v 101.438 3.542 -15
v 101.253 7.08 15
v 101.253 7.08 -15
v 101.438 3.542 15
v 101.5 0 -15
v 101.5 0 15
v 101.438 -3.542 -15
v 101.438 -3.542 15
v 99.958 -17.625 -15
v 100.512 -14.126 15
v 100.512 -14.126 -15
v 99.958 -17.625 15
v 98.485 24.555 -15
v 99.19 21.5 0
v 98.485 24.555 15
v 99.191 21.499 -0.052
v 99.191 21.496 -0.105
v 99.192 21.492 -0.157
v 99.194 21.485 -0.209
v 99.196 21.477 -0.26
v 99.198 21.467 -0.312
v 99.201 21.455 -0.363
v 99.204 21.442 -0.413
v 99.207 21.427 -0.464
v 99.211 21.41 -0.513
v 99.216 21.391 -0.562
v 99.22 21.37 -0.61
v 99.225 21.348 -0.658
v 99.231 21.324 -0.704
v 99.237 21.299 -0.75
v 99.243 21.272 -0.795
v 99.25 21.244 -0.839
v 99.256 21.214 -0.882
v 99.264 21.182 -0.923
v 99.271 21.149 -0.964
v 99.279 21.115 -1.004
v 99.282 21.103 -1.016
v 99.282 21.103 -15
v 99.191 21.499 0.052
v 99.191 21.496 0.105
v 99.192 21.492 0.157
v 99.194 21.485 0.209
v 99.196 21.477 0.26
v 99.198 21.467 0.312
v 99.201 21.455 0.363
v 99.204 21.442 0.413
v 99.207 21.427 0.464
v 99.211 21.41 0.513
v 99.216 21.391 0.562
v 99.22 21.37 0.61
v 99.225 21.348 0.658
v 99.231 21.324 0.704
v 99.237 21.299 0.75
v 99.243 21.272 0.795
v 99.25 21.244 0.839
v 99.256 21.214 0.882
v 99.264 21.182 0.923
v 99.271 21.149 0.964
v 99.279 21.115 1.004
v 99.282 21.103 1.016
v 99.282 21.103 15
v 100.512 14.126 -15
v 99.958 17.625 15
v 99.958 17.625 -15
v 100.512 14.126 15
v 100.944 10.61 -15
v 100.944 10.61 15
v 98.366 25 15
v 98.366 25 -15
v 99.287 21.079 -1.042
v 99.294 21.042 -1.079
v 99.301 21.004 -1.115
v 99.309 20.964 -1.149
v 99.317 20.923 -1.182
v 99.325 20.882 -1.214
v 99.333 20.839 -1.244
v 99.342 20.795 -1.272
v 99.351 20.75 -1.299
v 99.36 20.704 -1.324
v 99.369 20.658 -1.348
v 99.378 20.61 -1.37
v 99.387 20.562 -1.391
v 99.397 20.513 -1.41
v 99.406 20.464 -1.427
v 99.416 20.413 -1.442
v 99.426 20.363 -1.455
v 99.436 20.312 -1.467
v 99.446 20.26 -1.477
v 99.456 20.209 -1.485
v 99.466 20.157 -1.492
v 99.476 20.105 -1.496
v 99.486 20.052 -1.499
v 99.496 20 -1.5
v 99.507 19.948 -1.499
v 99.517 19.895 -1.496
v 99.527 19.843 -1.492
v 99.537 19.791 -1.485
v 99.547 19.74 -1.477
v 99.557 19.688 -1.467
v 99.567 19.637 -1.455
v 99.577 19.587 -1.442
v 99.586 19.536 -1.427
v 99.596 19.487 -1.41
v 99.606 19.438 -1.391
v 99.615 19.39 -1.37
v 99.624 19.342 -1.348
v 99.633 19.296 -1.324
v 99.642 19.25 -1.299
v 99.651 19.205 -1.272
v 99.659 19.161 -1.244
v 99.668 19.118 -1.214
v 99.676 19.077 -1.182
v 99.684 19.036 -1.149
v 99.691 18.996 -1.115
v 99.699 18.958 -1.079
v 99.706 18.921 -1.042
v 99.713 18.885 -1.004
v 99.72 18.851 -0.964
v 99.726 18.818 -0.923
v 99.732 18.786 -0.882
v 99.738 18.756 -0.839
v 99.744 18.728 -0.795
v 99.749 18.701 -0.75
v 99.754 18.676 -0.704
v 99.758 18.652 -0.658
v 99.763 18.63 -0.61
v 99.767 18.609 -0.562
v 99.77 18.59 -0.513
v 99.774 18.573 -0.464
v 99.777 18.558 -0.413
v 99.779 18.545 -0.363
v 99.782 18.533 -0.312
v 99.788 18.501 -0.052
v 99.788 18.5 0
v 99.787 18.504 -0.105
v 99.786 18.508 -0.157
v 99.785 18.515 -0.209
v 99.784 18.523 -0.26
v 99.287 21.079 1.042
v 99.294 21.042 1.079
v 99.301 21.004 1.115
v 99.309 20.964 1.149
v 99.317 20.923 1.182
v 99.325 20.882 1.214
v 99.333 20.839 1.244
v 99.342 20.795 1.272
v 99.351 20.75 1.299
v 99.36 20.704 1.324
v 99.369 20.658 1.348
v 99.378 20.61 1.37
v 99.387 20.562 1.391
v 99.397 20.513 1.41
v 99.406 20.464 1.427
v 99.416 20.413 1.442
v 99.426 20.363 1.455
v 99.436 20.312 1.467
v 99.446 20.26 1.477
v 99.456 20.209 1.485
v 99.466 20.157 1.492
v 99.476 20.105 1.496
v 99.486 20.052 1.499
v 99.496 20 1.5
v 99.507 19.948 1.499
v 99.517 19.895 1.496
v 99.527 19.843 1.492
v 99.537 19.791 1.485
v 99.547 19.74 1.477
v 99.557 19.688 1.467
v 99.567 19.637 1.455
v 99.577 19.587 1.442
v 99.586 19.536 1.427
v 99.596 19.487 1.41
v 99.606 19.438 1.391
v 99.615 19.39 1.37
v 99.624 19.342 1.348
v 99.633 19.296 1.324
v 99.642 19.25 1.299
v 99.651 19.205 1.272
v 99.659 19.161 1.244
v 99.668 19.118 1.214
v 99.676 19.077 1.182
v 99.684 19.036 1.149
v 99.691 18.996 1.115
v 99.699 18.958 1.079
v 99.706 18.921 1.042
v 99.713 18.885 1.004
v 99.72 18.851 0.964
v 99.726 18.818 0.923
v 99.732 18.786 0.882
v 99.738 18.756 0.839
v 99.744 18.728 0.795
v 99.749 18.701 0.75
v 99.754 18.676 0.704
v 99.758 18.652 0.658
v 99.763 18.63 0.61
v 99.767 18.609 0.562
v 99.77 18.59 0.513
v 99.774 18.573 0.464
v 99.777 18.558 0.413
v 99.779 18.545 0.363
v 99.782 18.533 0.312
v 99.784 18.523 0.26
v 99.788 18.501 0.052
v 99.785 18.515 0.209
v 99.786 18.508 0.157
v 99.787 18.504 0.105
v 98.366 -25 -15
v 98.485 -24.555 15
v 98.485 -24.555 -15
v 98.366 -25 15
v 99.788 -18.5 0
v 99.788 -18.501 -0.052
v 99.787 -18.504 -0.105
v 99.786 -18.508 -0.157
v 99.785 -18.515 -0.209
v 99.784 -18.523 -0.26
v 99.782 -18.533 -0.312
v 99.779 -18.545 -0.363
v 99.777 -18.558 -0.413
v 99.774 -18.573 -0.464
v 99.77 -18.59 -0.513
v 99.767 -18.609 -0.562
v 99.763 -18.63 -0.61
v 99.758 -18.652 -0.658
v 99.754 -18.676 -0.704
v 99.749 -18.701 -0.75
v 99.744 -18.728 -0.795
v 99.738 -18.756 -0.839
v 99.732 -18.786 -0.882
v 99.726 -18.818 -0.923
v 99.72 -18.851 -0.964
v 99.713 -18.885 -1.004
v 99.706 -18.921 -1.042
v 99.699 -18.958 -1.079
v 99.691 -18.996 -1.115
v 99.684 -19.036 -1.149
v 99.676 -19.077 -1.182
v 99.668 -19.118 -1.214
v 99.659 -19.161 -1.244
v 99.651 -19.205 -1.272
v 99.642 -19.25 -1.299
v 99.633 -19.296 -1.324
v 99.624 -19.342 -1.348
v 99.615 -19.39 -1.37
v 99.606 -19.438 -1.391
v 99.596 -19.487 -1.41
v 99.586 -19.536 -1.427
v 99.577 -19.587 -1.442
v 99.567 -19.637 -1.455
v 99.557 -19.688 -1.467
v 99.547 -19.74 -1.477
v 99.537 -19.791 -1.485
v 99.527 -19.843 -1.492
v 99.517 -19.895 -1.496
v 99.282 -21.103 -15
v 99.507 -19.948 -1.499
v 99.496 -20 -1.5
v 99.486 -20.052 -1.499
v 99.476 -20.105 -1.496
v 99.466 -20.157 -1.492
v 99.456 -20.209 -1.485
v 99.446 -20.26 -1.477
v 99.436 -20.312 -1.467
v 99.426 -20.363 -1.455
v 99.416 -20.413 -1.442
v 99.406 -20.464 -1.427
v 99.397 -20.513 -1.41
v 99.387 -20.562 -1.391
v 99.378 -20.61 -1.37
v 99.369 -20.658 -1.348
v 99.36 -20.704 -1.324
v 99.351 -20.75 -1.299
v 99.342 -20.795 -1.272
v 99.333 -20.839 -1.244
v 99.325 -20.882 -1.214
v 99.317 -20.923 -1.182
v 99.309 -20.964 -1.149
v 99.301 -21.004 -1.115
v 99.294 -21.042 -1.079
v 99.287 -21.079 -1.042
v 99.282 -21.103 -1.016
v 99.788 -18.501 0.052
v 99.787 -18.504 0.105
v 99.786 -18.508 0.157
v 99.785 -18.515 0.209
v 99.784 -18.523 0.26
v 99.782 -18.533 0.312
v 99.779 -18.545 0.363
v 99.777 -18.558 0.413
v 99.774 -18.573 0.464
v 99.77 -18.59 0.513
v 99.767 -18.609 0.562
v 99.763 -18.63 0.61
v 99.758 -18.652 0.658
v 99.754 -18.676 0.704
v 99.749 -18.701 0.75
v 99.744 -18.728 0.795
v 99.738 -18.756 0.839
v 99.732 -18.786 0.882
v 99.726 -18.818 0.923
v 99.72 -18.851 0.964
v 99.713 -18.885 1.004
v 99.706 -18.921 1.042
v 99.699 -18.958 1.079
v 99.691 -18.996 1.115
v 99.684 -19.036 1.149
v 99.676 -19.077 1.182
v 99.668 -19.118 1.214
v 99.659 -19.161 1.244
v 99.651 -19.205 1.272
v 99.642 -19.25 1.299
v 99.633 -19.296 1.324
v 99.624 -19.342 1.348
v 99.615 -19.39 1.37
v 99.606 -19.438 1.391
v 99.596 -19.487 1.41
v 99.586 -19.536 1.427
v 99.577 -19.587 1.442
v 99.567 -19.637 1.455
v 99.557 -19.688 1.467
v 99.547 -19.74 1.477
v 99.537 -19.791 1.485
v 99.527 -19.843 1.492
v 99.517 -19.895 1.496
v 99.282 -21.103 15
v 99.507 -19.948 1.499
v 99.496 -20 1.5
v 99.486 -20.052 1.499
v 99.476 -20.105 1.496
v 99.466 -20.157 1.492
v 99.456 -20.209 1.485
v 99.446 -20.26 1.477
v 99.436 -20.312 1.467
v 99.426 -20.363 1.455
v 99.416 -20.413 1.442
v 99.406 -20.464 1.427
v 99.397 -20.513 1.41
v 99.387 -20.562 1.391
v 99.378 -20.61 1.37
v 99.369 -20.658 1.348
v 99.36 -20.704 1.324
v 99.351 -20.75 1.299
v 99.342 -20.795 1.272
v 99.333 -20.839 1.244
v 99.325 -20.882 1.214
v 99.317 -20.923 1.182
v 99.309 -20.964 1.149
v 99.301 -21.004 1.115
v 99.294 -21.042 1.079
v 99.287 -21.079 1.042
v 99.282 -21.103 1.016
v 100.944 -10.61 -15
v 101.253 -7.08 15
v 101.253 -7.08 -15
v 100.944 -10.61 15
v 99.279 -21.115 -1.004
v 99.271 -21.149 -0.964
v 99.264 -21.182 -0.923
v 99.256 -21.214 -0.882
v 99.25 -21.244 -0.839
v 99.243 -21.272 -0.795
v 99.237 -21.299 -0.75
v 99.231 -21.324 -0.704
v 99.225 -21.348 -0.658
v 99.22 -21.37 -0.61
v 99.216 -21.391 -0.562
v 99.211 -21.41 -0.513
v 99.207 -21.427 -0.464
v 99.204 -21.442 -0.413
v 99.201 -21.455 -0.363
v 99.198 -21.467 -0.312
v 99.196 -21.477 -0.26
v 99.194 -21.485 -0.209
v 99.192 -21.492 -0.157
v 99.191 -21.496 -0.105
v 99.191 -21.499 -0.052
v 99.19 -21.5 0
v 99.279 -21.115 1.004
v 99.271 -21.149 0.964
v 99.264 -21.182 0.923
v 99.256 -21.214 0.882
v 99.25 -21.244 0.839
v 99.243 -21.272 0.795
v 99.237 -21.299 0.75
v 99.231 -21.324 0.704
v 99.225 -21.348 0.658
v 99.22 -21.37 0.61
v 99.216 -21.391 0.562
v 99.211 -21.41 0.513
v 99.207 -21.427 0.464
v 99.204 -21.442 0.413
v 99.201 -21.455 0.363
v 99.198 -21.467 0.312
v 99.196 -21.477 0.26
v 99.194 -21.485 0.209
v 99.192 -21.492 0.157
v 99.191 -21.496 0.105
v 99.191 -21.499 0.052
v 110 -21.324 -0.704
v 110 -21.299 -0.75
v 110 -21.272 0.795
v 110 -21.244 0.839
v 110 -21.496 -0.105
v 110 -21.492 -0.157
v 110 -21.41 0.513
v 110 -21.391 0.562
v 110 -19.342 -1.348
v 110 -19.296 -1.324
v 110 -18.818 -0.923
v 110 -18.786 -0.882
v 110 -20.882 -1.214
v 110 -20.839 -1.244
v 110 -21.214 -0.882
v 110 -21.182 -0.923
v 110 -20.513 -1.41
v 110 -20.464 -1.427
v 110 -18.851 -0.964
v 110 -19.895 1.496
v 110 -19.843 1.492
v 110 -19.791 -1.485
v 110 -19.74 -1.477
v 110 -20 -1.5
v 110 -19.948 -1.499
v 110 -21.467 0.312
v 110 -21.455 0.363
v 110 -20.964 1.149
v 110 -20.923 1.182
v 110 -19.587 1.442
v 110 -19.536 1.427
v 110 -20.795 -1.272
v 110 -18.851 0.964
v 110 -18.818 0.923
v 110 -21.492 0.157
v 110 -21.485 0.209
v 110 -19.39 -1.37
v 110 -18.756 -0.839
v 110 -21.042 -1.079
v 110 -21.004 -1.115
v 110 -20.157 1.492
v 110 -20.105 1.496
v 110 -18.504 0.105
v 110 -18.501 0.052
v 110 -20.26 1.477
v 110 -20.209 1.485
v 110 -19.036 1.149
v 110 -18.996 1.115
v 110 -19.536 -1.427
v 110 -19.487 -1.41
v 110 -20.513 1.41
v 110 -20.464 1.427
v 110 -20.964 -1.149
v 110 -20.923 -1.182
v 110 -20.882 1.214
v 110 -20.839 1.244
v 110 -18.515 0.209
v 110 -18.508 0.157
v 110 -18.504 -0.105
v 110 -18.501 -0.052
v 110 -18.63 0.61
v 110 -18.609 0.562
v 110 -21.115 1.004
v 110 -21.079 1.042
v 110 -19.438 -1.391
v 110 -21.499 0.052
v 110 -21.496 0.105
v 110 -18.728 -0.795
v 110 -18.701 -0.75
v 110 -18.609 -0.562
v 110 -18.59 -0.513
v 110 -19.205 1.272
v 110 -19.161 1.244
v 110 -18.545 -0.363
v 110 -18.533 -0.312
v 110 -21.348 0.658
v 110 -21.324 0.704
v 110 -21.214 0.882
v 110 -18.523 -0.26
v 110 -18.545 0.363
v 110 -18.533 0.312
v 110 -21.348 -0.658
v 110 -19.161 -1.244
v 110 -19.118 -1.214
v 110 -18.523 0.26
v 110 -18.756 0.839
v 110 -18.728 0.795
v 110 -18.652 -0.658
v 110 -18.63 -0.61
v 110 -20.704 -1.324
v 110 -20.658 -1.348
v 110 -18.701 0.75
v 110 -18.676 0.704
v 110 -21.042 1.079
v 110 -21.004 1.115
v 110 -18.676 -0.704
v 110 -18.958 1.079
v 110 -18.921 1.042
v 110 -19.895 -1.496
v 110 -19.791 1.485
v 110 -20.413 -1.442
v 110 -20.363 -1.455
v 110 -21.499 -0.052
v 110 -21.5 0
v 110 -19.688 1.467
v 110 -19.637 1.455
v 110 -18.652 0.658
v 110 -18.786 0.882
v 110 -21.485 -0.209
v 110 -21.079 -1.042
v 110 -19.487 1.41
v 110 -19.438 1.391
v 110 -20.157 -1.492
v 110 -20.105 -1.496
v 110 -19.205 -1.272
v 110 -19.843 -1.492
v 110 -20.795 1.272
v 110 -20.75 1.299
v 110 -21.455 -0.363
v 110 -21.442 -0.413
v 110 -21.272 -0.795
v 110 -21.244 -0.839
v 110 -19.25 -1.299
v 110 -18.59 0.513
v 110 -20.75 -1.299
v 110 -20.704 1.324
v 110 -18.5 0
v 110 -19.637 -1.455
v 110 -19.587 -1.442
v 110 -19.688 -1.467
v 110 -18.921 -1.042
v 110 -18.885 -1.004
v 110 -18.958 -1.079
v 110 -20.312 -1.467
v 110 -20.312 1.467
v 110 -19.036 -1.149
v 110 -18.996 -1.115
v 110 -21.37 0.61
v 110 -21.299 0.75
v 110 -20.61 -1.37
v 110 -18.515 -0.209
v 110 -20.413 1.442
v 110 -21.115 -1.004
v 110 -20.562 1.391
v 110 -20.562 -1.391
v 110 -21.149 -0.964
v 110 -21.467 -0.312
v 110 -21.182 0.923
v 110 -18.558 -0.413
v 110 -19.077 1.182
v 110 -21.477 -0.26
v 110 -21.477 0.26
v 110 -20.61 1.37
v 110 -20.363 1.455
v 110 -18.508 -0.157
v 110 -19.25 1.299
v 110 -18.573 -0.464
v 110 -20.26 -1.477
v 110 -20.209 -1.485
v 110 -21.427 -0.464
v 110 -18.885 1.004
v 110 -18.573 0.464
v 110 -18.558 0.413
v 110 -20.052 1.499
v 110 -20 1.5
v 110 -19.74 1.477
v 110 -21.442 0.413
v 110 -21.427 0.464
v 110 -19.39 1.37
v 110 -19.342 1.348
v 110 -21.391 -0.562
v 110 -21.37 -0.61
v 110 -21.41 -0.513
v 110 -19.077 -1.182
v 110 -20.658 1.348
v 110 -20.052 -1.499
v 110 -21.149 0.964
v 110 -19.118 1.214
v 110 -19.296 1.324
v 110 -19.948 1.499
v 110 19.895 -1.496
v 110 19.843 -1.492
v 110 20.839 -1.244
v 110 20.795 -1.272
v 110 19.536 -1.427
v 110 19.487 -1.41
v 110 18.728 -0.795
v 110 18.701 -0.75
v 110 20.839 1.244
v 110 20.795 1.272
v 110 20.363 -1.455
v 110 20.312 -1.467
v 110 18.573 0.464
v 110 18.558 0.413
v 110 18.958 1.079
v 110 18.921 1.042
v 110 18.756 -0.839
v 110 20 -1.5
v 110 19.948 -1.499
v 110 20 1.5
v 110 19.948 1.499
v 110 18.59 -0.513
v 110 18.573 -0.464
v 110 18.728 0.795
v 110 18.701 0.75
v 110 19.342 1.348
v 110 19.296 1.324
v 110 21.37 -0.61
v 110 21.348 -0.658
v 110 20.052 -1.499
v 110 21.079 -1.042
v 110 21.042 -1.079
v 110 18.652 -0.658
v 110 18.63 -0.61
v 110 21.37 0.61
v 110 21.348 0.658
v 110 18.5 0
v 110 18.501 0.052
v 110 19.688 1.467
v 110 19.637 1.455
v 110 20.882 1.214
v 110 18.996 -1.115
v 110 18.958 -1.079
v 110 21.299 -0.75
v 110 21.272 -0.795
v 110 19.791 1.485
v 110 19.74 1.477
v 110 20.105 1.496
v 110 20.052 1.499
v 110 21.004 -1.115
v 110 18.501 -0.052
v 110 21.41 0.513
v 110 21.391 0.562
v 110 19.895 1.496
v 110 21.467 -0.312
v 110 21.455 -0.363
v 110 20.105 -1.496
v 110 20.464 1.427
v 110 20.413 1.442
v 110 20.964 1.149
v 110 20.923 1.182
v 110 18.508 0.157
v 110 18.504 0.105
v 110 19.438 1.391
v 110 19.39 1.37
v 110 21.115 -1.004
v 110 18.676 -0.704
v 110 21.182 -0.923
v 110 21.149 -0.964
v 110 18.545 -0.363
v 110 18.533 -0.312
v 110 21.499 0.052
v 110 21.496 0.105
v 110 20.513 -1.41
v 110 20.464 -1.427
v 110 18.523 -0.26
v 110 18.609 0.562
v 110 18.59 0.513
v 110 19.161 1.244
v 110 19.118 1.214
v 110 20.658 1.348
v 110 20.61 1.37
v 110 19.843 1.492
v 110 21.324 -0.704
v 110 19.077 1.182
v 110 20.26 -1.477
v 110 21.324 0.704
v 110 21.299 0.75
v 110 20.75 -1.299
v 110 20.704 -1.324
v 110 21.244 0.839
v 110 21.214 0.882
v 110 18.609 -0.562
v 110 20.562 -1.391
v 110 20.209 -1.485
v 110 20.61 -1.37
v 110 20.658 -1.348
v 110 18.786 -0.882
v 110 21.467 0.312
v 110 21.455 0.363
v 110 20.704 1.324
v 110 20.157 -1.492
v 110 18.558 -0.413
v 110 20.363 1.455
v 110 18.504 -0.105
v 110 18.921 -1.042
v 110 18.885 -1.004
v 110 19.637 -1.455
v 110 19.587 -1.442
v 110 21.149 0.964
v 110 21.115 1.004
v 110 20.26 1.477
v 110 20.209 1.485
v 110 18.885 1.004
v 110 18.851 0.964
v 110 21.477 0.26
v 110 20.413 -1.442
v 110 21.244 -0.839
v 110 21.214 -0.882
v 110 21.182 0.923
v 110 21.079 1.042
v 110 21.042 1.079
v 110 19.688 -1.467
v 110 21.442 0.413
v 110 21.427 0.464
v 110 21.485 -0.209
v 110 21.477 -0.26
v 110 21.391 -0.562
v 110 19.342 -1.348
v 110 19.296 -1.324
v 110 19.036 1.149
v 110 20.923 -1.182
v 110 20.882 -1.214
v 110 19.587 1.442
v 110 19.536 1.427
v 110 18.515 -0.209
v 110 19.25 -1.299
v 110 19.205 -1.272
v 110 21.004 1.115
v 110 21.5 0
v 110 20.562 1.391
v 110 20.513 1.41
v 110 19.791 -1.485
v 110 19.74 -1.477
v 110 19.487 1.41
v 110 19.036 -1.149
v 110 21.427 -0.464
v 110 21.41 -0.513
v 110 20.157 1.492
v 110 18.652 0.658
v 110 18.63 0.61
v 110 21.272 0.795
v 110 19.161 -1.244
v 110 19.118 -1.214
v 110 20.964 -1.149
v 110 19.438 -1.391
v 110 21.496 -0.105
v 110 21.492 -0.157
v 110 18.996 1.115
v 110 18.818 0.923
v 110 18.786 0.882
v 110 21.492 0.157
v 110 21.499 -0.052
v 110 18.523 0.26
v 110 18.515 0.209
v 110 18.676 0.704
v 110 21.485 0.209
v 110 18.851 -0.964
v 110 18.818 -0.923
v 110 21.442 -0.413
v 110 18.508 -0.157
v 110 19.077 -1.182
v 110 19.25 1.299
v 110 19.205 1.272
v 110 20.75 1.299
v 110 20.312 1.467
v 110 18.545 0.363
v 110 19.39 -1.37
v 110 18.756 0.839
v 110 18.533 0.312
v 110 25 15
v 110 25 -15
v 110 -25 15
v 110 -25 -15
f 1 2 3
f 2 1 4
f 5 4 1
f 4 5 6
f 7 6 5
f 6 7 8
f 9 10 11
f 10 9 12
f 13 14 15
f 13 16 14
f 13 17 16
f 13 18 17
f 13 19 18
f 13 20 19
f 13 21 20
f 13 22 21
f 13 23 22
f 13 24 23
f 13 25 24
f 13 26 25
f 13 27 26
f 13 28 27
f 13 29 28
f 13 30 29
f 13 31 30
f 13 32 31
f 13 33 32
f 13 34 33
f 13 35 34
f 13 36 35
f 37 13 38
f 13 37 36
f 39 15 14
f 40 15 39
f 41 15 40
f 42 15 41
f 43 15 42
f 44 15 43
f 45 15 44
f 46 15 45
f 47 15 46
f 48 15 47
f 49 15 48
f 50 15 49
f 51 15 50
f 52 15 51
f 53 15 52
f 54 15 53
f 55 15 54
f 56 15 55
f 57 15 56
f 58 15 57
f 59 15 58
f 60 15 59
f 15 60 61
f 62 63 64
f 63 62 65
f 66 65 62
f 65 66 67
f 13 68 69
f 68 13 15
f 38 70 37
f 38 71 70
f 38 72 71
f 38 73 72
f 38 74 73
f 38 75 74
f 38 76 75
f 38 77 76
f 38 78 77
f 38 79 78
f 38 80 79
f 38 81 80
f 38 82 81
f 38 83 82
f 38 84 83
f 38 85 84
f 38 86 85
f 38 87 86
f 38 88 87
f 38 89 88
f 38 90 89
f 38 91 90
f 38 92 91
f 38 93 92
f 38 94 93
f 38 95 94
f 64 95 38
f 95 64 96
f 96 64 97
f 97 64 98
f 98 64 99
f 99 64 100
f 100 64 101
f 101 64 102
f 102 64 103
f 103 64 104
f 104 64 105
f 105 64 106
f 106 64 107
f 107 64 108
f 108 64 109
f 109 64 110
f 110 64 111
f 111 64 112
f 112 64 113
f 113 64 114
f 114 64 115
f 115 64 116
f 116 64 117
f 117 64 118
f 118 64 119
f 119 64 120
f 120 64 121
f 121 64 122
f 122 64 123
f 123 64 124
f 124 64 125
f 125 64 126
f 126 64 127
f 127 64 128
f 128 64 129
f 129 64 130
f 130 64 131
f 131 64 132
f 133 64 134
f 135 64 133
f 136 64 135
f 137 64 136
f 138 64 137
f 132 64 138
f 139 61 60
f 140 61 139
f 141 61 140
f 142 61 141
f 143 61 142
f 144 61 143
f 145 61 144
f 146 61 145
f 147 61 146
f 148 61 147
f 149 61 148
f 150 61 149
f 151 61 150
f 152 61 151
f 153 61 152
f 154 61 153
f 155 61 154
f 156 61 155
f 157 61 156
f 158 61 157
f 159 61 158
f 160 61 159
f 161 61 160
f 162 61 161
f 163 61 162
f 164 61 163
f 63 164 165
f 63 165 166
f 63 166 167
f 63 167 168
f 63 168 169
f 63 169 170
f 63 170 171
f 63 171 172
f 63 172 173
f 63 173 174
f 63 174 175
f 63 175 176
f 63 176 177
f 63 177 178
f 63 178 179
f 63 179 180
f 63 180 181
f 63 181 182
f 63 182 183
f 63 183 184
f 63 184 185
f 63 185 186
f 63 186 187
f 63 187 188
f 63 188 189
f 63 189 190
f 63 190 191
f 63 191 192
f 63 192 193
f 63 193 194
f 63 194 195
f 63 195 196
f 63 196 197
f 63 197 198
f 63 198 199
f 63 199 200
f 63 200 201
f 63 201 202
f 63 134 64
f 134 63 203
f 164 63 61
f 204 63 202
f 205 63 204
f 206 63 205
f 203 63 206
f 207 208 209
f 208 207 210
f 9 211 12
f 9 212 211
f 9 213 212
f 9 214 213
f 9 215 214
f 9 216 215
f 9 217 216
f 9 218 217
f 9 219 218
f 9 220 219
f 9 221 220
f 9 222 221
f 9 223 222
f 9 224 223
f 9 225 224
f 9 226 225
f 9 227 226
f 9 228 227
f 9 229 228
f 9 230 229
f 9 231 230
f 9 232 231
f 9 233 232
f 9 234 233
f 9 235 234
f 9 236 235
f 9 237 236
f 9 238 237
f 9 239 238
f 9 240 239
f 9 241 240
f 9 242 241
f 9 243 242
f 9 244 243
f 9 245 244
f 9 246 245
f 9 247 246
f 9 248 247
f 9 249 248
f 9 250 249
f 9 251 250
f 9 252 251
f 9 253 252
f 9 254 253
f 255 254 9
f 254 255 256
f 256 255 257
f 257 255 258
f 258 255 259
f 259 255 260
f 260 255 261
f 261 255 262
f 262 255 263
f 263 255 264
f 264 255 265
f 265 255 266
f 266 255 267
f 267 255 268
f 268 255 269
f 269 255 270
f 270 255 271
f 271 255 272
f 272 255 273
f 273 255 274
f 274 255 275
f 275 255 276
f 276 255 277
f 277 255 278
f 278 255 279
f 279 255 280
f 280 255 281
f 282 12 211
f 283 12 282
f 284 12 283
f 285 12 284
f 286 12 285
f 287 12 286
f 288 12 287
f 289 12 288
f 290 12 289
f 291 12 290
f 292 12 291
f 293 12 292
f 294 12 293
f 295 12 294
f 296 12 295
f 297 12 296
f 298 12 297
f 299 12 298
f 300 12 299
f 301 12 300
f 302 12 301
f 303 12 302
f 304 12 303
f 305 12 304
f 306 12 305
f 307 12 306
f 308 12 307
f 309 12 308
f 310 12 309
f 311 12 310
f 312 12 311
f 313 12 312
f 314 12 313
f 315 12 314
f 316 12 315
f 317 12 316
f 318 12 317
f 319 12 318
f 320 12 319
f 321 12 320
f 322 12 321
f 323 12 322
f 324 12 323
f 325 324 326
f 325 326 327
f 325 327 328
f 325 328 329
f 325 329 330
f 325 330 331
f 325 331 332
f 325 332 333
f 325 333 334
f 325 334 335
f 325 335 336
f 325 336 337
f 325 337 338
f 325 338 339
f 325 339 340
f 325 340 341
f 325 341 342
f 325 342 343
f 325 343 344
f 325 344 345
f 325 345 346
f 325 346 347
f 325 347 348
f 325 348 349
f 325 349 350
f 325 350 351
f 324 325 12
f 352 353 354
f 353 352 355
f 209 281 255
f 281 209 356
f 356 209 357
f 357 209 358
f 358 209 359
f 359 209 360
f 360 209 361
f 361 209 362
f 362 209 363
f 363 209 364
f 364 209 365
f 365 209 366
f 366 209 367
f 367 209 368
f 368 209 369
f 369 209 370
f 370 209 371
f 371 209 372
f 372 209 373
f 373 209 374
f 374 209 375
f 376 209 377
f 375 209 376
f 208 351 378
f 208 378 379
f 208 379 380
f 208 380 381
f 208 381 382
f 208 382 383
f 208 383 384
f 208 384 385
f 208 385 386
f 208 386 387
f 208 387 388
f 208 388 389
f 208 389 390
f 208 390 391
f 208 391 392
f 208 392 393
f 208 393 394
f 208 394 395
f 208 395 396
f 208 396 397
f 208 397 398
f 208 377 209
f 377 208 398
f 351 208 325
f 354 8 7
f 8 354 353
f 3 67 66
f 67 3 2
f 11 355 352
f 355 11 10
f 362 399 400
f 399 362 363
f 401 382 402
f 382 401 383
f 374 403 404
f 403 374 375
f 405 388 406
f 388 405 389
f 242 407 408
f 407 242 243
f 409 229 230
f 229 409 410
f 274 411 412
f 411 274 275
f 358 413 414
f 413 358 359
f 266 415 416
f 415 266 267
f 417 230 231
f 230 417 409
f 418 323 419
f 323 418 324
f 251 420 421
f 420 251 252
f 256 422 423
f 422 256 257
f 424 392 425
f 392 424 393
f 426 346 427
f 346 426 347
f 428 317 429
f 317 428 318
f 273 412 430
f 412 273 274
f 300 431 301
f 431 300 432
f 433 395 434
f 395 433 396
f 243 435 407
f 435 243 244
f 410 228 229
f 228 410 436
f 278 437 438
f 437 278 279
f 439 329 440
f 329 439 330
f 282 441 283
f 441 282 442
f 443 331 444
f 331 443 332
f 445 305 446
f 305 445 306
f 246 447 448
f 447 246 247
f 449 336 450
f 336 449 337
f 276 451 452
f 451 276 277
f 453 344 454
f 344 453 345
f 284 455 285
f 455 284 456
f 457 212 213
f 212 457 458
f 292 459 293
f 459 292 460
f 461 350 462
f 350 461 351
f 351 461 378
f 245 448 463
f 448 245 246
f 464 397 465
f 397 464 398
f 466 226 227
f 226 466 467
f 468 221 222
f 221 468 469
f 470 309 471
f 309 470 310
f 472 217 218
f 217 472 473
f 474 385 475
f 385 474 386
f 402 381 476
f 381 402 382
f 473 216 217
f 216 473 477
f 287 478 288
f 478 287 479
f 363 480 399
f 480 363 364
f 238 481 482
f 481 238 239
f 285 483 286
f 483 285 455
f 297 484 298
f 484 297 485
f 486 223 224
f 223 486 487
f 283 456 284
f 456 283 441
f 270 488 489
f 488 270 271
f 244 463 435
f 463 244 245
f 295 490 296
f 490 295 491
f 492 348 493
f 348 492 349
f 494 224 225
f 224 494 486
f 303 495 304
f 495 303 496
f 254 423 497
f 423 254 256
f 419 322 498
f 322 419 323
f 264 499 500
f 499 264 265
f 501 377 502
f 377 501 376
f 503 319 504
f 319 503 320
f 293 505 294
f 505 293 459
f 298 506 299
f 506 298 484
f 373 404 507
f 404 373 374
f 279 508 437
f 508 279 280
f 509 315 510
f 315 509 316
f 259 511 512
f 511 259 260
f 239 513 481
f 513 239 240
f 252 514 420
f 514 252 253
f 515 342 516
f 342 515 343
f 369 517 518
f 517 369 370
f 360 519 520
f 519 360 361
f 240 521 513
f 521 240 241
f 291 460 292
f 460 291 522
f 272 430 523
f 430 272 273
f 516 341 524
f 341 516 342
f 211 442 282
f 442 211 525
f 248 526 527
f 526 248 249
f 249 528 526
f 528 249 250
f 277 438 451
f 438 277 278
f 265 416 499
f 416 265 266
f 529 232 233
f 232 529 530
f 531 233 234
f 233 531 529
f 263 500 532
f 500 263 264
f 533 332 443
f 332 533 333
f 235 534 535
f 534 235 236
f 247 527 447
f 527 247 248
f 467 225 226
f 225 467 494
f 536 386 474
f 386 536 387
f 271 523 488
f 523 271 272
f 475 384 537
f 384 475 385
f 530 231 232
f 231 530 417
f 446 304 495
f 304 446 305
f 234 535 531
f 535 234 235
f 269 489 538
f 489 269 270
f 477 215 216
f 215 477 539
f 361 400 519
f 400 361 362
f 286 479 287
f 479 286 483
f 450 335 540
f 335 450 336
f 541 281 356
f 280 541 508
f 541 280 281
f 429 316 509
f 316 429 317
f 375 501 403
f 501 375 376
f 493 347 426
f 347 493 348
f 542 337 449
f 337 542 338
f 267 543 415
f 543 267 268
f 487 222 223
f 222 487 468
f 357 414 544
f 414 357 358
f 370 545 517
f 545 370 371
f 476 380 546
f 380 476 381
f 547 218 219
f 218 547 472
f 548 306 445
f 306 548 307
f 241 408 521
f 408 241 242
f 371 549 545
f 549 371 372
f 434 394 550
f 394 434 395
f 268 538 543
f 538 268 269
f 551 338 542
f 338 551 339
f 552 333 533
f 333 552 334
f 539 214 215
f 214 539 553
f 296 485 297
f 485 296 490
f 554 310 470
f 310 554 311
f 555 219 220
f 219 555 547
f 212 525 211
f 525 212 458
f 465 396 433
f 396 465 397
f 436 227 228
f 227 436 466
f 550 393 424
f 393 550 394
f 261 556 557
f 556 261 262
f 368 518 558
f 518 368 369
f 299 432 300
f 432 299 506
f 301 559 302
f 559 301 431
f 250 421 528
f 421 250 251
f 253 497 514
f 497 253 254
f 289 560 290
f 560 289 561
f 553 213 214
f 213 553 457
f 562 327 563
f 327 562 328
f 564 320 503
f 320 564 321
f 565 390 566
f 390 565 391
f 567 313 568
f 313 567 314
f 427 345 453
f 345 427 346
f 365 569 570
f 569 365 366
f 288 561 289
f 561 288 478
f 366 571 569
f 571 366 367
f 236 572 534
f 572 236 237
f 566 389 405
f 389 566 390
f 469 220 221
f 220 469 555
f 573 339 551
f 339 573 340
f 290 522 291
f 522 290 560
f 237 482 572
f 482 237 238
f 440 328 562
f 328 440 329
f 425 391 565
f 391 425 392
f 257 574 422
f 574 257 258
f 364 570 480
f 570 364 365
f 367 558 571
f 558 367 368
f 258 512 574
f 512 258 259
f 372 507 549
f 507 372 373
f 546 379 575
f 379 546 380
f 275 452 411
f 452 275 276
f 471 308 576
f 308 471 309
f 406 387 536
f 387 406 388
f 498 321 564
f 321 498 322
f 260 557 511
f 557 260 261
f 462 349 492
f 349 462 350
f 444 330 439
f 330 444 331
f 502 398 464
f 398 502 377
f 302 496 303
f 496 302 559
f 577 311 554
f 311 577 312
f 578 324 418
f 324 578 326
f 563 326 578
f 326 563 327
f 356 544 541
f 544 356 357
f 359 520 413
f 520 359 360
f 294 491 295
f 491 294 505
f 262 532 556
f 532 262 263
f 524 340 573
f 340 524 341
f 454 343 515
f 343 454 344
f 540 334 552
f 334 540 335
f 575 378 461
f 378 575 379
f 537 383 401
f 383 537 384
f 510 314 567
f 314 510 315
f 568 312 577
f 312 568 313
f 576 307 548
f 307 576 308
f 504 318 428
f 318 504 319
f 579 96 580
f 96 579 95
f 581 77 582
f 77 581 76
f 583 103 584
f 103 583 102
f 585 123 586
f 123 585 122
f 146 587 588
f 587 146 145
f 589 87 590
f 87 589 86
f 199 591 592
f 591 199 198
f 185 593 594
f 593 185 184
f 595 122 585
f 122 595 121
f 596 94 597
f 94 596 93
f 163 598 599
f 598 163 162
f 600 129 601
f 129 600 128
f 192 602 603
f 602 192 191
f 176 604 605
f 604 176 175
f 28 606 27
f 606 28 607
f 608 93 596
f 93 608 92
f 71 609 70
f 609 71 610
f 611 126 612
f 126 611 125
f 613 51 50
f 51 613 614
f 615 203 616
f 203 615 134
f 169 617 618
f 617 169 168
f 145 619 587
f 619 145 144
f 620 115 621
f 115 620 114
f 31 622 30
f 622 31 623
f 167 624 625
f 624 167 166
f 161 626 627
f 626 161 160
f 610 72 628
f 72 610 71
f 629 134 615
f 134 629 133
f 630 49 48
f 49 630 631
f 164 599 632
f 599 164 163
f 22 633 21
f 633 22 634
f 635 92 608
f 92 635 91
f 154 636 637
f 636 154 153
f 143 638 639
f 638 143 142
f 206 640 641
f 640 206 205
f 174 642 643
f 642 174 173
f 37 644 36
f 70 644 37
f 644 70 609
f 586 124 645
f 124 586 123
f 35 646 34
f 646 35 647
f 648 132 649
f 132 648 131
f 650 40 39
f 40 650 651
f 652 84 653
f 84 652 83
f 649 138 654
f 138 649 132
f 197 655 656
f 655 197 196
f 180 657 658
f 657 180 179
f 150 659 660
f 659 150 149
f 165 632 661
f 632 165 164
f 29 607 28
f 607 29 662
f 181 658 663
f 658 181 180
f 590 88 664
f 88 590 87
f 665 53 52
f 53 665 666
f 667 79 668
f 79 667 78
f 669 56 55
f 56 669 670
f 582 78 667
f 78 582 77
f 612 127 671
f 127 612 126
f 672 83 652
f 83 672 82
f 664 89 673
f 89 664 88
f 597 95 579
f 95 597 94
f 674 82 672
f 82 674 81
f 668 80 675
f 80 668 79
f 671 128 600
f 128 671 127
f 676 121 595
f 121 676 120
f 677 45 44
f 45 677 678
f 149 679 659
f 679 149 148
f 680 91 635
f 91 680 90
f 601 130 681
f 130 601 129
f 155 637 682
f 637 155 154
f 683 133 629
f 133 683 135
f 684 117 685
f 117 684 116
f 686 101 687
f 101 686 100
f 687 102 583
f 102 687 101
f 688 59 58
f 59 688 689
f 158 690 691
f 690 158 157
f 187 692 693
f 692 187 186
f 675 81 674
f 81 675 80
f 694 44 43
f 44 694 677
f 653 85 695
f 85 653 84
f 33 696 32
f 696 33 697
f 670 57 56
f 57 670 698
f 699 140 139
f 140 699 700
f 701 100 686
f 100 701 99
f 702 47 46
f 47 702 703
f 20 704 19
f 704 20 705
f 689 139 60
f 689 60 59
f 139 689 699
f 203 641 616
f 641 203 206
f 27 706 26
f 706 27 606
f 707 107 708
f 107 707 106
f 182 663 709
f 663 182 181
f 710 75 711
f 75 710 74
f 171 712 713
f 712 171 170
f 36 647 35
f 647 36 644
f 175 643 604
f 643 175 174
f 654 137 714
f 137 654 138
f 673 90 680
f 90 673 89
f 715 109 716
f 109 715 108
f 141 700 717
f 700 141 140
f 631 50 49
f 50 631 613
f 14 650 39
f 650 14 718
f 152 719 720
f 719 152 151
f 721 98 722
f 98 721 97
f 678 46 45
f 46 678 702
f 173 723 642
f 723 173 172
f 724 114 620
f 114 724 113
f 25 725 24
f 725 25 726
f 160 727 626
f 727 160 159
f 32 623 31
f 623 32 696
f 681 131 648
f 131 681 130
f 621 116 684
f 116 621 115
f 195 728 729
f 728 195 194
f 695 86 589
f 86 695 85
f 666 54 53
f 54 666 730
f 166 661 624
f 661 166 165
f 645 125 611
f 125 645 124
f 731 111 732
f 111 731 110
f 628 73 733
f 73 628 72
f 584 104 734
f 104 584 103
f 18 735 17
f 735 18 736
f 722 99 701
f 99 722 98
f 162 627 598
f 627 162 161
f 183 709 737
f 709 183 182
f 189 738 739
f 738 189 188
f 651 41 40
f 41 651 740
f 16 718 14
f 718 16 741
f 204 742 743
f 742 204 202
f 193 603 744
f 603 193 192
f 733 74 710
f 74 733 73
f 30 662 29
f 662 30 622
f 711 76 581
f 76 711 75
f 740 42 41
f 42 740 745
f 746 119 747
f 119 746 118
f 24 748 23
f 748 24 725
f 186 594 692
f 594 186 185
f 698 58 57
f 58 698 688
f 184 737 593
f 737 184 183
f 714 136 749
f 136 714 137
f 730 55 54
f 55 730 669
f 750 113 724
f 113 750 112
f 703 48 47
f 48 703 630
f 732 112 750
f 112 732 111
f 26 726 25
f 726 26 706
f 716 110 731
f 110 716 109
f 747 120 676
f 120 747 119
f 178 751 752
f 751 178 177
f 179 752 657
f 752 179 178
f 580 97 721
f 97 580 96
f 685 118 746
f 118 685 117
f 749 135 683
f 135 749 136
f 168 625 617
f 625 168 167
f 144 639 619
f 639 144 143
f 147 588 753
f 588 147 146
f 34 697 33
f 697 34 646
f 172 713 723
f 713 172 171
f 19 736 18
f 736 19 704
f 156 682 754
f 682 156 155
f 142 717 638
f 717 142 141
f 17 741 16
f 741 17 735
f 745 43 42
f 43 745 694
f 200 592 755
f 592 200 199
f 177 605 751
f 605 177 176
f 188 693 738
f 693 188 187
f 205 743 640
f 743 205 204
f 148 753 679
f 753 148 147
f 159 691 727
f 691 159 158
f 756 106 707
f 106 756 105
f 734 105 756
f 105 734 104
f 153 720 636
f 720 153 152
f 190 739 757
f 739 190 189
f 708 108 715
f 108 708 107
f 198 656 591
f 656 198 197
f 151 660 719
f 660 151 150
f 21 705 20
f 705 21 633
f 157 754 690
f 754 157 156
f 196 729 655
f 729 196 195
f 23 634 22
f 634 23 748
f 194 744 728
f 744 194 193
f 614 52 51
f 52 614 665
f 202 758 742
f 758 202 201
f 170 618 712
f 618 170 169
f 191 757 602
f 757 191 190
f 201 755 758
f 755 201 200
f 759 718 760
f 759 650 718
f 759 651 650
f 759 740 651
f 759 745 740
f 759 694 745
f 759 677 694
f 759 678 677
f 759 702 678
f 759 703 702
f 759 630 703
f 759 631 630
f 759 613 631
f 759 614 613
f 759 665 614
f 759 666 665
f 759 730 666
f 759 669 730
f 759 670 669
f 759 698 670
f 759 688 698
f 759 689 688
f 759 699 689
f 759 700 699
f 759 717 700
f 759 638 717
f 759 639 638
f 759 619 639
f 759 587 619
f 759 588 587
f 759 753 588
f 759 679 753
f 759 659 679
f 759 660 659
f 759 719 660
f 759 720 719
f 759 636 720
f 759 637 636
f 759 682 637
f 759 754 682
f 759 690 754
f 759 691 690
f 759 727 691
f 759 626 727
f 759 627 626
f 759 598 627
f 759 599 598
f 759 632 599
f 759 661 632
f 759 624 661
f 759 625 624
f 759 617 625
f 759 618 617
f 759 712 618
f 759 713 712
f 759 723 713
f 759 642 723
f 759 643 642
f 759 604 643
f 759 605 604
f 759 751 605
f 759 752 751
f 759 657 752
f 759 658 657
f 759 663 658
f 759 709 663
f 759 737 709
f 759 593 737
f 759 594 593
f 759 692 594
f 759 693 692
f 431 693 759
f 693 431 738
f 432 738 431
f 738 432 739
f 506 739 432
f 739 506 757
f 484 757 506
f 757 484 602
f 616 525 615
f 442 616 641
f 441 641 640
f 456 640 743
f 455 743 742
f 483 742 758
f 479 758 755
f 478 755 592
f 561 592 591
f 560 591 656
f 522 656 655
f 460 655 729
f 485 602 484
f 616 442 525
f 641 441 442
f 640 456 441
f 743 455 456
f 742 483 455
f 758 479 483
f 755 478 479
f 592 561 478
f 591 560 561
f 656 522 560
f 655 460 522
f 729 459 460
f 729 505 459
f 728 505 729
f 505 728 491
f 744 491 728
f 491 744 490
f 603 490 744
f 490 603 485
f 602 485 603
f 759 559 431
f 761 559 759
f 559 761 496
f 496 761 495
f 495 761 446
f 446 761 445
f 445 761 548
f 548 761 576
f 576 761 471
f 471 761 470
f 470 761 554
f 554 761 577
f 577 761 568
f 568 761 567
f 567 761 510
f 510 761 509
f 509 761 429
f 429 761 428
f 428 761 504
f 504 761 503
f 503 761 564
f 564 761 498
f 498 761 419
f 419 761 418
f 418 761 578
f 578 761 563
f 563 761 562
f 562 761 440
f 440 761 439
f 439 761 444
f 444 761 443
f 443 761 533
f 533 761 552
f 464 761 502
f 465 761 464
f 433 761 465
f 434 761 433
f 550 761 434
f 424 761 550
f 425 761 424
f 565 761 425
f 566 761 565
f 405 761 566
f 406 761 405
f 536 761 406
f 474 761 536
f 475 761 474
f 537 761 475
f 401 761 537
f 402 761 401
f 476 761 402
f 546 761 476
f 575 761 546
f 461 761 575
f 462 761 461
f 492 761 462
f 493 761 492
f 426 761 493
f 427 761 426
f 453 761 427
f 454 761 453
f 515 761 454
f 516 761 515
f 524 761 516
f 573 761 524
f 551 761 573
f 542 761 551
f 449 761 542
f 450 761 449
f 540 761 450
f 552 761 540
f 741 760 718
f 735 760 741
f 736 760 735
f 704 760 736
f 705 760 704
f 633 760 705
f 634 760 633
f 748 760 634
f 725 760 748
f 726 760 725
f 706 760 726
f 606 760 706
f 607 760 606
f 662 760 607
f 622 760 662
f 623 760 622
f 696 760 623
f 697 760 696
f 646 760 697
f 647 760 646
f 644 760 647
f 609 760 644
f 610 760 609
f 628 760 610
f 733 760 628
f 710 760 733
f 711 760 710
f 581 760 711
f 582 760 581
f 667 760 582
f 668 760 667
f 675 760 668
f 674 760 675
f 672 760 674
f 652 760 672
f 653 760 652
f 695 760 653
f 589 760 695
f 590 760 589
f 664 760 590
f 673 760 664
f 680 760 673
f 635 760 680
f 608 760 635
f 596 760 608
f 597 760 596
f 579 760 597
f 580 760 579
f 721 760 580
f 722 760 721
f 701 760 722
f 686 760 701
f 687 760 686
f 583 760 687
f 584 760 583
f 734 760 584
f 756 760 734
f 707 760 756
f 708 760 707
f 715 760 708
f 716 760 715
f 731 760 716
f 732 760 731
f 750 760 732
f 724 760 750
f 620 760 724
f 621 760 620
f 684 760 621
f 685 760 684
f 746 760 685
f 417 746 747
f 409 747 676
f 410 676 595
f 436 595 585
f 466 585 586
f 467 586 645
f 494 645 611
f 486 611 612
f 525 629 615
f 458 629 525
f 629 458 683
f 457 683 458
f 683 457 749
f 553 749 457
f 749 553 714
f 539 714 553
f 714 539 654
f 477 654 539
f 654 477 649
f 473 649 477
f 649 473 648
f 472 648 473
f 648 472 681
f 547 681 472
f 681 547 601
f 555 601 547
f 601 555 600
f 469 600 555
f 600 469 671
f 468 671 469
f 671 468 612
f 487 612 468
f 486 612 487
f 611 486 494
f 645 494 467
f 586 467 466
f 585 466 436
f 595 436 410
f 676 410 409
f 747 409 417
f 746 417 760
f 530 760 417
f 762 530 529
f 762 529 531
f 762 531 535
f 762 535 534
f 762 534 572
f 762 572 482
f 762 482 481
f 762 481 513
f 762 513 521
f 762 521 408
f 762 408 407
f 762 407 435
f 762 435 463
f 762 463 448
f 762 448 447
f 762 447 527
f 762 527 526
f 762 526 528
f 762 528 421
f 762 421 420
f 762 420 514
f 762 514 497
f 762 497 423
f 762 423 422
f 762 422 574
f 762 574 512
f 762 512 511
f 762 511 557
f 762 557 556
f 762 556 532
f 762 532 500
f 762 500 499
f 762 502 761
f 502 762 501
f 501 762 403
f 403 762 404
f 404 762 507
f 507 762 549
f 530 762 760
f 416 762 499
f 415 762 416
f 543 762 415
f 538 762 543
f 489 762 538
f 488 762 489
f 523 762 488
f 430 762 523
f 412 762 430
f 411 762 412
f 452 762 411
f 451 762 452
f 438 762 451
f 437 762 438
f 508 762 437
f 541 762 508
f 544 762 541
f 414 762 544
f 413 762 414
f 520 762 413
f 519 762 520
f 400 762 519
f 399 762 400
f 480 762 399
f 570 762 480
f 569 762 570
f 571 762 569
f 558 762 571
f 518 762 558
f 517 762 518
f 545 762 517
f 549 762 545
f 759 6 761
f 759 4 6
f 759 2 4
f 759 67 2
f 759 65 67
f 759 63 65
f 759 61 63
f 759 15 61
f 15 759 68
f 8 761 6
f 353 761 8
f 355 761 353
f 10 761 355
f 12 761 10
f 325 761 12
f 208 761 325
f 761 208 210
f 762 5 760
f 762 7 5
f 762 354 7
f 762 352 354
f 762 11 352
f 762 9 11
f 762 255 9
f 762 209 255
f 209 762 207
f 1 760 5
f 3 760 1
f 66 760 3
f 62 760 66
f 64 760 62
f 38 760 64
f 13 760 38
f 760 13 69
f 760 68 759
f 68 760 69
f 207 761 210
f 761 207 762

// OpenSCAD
// Drink bottle holder
$fn = 180;

difference(){
    translate ([75, -25, -15]) cube ([35, 50, 30], center = false);
    union() {
        cylinder (50, d = 203, center = true);
        translate ([0,-20,0]) rotate ([0,90,0]) cylinder (300, d = 3, center = false);
        translate ([0,20,0]) rotate ([0,90,0]) cylinder (300, d = 3, center = false);
    } 
}
